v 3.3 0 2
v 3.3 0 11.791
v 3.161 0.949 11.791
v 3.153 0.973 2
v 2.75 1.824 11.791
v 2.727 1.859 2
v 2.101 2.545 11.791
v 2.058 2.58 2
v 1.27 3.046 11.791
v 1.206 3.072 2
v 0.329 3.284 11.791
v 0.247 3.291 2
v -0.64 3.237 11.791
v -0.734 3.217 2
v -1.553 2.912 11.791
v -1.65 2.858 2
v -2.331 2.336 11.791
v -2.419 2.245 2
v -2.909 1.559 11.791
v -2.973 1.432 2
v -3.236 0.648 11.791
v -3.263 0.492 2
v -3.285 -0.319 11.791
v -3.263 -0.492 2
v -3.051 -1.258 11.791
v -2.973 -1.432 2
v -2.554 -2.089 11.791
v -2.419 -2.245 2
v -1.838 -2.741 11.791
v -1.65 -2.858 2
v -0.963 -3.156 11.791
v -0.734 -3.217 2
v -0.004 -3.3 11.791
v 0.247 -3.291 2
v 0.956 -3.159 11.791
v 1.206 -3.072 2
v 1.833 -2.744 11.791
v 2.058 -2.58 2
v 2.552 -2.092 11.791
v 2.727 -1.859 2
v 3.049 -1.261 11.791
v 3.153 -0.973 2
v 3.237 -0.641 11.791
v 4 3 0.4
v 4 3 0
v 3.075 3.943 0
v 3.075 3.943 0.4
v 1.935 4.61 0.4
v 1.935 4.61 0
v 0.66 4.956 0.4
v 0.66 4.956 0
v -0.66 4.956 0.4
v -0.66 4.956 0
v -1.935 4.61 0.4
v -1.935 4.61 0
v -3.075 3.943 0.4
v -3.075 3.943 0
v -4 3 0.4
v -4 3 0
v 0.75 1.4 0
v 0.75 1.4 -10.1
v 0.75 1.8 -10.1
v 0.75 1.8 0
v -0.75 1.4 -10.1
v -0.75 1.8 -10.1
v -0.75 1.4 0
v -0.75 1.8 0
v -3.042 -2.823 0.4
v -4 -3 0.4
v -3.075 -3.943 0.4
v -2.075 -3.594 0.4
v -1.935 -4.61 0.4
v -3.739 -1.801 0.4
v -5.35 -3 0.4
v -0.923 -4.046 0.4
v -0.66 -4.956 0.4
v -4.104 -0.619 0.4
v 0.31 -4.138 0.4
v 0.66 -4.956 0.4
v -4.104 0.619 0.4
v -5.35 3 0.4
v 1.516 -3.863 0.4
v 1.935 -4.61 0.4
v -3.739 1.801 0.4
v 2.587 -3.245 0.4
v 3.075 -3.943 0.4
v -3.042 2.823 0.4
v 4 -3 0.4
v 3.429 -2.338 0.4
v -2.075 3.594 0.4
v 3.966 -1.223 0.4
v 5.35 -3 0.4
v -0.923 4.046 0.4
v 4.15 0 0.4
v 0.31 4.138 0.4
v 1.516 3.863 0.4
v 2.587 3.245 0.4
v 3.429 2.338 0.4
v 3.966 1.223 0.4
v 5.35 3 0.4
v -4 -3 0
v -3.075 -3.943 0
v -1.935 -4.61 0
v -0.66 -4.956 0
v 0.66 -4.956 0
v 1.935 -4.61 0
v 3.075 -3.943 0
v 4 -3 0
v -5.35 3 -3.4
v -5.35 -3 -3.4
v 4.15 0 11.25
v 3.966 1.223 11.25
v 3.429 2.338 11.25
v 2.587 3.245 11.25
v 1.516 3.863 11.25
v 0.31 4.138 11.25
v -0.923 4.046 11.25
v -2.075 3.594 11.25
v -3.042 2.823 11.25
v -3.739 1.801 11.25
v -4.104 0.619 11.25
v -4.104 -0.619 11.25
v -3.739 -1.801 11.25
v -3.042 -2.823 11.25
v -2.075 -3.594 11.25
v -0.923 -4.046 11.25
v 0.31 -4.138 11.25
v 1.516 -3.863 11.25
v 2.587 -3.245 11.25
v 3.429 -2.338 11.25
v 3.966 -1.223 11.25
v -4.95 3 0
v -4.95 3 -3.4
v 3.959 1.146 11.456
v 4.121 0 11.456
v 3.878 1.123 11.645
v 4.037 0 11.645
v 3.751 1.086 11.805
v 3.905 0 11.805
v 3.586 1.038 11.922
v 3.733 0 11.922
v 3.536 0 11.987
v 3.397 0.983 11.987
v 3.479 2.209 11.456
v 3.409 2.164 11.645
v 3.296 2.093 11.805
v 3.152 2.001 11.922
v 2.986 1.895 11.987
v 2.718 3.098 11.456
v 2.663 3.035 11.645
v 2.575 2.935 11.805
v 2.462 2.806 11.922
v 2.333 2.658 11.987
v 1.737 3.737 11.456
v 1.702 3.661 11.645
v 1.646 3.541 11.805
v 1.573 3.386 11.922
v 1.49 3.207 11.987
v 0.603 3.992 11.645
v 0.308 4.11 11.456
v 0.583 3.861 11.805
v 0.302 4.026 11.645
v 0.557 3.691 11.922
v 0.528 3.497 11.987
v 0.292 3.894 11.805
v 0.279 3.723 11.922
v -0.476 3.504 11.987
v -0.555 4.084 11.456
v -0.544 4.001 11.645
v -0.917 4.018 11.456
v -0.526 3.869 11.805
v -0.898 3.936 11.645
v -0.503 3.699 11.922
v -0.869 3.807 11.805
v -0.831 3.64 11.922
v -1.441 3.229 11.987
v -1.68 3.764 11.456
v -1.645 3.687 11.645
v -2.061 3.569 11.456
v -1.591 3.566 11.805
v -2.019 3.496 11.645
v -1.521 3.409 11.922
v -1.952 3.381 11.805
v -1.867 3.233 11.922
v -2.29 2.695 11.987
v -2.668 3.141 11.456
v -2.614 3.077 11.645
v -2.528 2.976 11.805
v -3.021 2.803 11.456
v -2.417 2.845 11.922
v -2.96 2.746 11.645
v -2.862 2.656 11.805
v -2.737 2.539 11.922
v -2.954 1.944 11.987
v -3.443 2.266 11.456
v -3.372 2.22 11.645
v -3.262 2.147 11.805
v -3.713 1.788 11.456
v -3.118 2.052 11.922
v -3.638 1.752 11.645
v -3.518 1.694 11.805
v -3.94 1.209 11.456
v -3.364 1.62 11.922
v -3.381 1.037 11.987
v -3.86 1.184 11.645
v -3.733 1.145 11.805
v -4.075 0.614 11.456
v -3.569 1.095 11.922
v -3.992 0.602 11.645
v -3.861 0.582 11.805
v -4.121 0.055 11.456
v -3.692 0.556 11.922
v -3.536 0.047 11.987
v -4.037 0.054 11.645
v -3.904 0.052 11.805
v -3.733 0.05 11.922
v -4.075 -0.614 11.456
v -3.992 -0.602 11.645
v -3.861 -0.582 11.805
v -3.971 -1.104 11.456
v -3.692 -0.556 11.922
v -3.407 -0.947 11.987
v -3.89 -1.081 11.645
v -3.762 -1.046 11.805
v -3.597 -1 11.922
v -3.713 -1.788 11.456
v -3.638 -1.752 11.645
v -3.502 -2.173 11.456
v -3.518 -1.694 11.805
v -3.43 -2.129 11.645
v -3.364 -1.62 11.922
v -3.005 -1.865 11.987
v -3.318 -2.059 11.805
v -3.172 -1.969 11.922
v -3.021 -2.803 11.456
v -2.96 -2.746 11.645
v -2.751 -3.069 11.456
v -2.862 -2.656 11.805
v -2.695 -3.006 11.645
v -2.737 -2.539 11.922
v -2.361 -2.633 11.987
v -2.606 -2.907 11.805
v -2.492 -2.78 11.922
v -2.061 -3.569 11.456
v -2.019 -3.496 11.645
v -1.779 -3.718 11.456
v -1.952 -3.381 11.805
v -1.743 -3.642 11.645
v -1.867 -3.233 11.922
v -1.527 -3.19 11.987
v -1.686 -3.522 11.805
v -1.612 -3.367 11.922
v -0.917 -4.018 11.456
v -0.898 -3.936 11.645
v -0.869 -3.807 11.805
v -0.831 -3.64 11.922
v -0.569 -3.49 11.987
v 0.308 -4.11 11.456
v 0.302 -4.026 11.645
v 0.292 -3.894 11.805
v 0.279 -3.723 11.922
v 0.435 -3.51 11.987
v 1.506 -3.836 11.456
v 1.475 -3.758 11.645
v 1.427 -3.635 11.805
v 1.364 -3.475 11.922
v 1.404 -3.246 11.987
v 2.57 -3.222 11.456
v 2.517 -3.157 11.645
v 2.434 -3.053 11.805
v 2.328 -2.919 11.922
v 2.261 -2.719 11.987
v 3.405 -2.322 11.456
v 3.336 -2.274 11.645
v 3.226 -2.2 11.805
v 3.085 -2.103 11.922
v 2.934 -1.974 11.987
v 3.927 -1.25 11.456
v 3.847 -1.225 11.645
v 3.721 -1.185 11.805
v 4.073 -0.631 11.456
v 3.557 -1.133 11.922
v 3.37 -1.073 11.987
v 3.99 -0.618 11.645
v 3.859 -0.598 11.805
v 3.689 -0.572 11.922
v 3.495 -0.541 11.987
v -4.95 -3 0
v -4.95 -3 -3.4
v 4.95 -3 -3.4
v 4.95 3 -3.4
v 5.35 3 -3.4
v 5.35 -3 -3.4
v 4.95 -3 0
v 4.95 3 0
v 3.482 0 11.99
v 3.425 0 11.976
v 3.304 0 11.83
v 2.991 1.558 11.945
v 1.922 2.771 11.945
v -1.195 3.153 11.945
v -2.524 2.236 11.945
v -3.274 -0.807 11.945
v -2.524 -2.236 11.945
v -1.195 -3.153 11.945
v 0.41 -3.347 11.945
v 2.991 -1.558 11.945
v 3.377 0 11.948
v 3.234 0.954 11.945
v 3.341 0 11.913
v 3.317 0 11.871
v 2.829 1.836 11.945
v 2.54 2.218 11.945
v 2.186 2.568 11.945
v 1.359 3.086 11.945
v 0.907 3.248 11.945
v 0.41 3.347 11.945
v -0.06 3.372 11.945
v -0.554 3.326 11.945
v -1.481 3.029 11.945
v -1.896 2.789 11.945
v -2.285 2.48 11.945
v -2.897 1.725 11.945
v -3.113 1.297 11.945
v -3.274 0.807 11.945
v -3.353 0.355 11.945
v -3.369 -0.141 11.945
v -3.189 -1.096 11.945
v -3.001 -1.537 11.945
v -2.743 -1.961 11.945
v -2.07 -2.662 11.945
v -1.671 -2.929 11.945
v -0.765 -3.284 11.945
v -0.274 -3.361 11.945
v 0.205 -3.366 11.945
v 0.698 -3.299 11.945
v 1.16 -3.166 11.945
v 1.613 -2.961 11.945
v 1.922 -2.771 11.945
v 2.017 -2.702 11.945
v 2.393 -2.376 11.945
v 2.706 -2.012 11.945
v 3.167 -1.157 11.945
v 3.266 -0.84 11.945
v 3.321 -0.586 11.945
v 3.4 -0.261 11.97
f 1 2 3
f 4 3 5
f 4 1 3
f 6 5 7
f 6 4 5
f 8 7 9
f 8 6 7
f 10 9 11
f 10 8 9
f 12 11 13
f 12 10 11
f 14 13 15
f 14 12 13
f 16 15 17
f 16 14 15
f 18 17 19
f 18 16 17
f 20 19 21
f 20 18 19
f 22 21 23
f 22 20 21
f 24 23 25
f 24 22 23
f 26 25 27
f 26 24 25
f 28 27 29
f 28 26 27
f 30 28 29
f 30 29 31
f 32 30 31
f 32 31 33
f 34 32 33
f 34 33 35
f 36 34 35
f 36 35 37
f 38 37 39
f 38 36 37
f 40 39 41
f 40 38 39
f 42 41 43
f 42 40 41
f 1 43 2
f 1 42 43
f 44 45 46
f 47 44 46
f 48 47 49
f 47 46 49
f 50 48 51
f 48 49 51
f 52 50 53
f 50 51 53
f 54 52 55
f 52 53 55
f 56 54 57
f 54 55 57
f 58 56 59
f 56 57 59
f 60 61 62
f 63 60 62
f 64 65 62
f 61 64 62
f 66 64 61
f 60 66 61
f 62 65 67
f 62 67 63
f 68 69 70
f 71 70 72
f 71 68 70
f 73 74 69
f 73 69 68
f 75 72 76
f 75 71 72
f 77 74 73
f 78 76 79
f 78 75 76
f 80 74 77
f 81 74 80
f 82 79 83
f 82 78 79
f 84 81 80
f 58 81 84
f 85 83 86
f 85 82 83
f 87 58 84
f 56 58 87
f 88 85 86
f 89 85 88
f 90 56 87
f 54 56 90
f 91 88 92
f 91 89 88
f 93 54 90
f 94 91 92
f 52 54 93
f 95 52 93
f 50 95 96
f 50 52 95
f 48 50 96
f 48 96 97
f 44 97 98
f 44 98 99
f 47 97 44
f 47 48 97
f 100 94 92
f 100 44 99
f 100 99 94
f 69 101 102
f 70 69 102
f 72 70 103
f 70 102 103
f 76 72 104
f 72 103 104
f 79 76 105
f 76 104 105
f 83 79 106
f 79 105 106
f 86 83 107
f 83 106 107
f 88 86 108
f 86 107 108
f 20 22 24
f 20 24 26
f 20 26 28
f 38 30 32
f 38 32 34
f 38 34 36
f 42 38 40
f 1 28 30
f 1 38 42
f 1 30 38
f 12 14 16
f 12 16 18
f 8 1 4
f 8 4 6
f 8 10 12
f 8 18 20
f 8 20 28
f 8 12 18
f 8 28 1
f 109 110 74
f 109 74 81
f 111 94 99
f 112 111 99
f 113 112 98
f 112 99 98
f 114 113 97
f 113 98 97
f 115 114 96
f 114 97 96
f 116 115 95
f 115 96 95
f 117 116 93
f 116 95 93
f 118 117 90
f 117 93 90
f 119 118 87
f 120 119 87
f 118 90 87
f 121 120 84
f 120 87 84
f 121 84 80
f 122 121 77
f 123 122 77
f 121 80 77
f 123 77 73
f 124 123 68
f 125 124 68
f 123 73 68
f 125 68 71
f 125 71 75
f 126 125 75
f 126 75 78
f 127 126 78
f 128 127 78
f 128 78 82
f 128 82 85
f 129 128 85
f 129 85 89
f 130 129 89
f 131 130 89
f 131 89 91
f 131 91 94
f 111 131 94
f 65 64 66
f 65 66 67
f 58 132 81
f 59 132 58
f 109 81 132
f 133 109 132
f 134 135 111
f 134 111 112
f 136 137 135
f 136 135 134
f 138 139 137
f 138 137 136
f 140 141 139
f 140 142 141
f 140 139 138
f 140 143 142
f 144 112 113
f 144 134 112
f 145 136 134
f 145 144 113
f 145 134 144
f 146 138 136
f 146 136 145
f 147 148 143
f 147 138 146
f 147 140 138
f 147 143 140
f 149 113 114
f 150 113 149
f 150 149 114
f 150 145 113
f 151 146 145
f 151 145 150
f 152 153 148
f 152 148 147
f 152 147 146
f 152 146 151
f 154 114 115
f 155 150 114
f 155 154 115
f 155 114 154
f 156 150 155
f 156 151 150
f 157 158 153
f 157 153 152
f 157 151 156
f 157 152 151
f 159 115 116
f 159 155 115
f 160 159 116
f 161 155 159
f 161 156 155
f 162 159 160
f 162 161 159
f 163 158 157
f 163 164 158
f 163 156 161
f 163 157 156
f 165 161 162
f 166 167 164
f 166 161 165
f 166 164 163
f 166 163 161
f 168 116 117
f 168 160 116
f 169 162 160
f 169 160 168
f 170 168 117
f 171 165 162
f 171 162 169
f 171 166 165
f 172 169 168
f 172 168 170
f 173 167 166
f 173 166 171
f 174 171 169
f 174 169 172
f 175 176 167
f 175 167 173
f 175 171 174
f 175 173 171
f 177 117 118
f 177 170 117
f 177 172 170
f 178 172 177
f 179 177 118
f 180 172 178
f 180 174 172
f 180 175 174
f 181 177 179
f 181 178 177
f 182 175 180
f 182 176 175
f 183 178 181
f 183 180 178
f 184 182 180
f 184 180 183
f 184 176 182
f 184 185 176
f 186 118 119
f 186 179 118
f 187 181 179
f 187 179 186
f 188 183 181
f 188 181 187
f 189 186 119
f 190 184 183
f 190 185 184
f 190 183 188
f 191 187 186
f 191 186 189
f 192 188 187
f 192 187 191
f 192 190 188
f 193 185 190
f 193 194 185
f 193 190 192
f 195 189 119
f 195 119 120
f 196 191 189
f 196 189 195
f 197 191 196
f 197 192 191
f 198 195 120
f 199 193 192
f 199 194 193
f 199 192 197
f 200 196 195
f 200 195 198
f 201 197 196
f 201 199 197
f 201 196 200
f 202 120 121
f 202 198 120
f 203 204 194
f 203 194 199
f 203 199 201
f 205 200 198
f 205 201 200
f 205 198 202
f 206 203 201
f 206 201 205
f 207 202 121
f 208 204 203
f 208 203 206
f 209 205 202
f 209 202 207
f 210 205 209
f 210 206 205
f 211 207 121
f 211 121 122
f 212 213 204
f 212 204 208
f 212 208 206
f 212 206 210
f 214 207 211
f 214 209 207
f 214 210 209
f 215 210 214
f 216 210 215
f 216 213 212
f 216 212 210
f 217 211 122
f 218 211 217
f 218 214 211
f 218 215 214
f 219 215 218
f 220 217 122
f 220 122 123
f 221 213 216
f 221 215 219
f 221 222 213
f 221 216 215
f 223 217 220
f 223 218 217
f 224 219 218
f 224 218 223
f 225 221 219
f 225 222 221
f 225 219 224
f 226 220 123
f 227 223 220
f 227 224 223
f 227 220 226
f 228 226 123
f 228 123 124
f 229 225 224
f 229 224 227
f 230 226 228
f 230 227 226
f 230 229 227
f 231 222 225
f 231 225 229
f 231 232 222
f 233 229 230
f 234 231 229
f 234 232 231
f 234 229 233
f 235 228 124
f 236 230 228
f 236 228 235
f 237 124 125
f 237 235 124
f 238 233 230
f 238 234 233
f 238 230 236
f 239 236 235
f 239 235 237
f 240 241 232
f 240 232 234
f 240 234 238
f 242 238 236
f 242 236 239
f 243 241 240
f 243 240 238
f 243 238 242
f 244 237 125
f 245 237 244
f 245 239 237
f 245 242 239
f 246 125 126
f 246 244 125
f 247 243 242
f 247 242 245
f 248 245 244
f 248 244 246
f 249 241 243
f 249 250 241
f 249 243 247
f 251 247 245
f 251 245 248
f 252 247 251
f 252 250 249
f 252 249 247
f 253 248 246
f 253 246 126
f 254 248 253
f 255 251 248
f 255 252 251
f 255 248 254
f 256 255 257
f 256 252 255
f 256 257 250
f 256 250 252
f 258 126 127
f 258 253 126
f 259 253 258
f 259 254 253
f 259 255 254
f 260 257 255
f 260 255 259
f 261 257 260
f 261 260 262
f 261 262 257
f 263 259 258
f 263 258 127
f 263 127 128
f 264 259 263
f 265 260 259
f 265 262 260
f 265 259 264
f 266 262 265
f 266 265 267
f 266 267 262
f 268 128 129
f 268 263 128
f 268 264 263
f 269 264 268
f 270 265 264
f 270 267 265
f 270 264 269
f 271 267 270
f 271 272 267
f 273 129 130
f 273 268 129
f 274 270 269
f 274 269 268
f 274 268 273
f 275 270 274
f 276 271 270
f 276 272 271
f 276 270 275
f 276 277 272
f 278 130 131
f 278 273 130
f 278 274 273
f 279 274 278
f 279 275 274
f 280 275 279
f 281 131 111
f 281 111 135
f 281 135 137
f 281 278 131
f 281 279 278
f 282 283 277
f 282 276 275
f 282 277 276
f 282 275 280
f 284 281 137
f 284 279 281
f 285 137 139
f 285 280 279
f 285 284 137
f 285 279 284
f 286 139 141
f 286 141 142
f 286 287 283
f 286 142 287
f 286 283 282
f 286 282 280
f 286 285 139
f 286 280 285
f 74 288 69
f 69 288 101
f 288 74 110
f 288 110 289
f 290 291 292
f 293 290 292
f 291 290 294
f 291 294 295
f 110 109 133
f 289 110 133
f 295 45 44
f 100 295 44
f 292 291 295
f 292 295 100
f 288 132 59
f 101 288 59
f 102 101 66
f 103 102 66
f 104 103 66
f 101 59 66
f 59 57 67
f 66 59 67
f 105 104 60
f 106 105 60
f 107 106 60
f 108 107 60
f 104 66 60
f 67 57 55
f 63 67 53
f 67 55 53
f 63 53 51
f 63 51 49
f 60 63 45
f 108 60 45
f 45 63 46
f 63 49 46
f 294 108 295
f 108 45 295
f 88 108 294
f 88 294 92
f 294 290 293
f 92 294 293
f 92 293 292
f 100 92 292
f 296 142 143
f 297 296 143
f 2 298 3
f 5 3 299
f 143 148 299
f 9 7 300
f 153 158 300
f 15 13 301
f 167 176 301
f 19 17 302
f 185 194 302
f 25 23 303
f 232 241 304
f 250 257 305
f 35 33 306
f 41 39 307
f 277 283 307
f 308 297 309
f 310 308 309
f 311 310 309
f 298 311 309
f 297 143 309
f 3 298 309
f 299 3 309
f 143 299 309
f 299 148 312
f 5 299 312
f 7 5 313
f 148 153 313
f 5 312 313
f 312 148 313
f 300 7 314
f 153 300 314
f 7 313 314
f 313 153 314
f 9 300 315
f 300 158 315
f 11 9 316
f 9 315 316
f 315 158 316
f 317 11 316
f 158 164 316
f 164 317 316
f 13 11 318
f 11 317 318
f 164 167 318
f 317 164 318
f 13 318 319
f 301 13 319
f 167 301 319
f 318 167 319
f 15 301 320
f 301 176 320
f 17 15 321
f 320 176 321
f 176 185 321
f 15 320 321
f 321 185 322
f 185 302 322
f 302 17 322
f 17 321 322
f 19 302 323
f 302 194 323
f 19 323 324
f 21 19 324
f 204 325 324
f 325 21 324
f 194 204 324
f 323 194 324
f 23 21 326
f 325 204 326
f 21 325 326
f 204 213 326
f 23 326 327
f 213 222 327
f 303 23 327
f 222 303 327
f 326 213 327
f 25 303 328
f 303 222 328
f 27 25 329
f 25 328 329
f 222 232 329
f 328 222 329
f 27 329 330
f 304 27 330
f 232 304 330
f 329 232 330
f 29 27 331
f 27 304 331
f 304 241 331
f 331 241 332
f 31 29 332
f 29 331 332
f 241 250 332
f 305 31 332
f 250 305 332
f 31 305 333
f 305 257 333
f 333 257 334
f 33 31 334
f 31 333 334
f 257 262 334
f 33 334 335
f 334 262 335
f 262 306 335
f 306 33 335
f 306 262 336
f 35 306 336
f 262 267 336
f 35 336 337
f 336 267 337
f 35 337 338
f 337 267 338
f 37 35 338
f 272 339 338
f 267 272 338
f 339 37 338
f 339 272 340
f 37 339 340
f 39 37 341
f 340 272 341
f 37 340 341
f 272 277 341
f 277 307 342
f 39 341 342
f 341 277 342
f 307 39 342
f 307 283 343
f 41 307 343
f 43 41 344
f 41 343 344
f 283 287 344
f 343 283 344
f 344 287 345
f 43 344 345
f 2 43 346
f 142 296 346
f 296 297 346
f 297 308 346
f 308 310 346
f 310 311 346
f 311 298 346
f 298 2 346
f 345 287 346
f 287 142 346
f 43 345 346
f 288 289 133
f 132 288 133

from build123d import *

# Parameters (mm, degrees)
BOX_W             = 10.7
BOX_H             = 6
BOX_DEPTH         = 0.4
CYLINDER_R        = 5
CYLINDER_DEPTH    = 0.4
CYLINDER001_R     = 4.15
CYLINDER001_DEPTH = 12
FILLET_R          = 0.75
CYLINDER002_R     = 3.3
CYLINDER002_DEPTH = 10
FILLET001_R       = 0.2
BOX001_W          = 1.5
BOX001_H          = 0.4
BOX001_DEPTH      = 10.1
BOX002_W          = 0.4
BOX002_H          = 6
BOX002_DEPTH      = 3.8
BOX003_W          = 0.4
BOX003_H          = 6
BOX003_DEPTH      = 3.8


with BuildPart() as part:
    # Box → Box (join)
    with BuildSketch(Plane(origin=(-5.35, -3, 0), x_dir=(1, 0, 0), z_dir=(0, 0, 1))):
        with Locations((5.35, 3)):
            Rectangle(BOX_W, BOX_H)
    extrude(amount=BOX_DEPTH)

    # Cylinder → Cylinder (join)
    with BuildSketch(Plane.XY):
        Circle(CYLINDER_R)
    extrude(amount=CYLINDER_DEPTH)

    # Cylinder001 → Cylinder001 (join)
    with BuildSketch(Plane.XY):
        Circle(CYLINDER001_R)
    extrude(amount=CYLINDER001_DEPTH)

    # Fillet
    fillet_edges = [part.edges().sort_by_distance(p)[0] for p in [
        (-4.15, 0, 12),
    ]]
    fillet(fillet_edges, radius=FILLET_R)

    # Cylinder002 → Cylinder002 (cut)
    with BuildSketch(Plane.XY.offset(2)):
        Circle(CYLINDER002_R)
    extrude(amount=CYLINDER002_DEPTH, mode=Mode.SUBTRACT)

    # Fillet001
    fillet001_edges = [part.edges().sort_by_distance(p)[0] for p in [
        (-3.3, 0, 12),
    ]]
    fillet(fillet001_edges, radius=FILLET001_R)

    # Box001 → Box001 (join)
    with BuildSketch(Plane(origin=(-0.75, 1.4, -10.1), x_dir=(1, 0, 0), z_dir=(0, 0, 1))):
        with Locations((0.75, 0.2)):
            Rectangle(BOX001_W, BOX001_H)
    extrude(amount=BOX001_DEPTH)

    # Box002 → Box002 (join)
    with BuildSketch(Plane(origin=(4.95, -3, -3.4), x_dir=(1, 0, 0), z_dir=(0, 0, 1))):
        with Locations((0.2, 3)):
            Rectangle(BOX002_W, BOX002_H)
    extrude(amount=BOX002_DEPTH)

    # Box003 → Box003 (join)
    with BuildSketch(Plane(origin=(-5.35, -3, -3.4), x_dir=(1, 0, 0), z_dir=(0, 0, 1))):
        with Locations((0.2, 3)):
            Rectangle(BOX003_W, BOX003_H)
    extrude(amount=BOX003_DEPTH)


solid = part.part
